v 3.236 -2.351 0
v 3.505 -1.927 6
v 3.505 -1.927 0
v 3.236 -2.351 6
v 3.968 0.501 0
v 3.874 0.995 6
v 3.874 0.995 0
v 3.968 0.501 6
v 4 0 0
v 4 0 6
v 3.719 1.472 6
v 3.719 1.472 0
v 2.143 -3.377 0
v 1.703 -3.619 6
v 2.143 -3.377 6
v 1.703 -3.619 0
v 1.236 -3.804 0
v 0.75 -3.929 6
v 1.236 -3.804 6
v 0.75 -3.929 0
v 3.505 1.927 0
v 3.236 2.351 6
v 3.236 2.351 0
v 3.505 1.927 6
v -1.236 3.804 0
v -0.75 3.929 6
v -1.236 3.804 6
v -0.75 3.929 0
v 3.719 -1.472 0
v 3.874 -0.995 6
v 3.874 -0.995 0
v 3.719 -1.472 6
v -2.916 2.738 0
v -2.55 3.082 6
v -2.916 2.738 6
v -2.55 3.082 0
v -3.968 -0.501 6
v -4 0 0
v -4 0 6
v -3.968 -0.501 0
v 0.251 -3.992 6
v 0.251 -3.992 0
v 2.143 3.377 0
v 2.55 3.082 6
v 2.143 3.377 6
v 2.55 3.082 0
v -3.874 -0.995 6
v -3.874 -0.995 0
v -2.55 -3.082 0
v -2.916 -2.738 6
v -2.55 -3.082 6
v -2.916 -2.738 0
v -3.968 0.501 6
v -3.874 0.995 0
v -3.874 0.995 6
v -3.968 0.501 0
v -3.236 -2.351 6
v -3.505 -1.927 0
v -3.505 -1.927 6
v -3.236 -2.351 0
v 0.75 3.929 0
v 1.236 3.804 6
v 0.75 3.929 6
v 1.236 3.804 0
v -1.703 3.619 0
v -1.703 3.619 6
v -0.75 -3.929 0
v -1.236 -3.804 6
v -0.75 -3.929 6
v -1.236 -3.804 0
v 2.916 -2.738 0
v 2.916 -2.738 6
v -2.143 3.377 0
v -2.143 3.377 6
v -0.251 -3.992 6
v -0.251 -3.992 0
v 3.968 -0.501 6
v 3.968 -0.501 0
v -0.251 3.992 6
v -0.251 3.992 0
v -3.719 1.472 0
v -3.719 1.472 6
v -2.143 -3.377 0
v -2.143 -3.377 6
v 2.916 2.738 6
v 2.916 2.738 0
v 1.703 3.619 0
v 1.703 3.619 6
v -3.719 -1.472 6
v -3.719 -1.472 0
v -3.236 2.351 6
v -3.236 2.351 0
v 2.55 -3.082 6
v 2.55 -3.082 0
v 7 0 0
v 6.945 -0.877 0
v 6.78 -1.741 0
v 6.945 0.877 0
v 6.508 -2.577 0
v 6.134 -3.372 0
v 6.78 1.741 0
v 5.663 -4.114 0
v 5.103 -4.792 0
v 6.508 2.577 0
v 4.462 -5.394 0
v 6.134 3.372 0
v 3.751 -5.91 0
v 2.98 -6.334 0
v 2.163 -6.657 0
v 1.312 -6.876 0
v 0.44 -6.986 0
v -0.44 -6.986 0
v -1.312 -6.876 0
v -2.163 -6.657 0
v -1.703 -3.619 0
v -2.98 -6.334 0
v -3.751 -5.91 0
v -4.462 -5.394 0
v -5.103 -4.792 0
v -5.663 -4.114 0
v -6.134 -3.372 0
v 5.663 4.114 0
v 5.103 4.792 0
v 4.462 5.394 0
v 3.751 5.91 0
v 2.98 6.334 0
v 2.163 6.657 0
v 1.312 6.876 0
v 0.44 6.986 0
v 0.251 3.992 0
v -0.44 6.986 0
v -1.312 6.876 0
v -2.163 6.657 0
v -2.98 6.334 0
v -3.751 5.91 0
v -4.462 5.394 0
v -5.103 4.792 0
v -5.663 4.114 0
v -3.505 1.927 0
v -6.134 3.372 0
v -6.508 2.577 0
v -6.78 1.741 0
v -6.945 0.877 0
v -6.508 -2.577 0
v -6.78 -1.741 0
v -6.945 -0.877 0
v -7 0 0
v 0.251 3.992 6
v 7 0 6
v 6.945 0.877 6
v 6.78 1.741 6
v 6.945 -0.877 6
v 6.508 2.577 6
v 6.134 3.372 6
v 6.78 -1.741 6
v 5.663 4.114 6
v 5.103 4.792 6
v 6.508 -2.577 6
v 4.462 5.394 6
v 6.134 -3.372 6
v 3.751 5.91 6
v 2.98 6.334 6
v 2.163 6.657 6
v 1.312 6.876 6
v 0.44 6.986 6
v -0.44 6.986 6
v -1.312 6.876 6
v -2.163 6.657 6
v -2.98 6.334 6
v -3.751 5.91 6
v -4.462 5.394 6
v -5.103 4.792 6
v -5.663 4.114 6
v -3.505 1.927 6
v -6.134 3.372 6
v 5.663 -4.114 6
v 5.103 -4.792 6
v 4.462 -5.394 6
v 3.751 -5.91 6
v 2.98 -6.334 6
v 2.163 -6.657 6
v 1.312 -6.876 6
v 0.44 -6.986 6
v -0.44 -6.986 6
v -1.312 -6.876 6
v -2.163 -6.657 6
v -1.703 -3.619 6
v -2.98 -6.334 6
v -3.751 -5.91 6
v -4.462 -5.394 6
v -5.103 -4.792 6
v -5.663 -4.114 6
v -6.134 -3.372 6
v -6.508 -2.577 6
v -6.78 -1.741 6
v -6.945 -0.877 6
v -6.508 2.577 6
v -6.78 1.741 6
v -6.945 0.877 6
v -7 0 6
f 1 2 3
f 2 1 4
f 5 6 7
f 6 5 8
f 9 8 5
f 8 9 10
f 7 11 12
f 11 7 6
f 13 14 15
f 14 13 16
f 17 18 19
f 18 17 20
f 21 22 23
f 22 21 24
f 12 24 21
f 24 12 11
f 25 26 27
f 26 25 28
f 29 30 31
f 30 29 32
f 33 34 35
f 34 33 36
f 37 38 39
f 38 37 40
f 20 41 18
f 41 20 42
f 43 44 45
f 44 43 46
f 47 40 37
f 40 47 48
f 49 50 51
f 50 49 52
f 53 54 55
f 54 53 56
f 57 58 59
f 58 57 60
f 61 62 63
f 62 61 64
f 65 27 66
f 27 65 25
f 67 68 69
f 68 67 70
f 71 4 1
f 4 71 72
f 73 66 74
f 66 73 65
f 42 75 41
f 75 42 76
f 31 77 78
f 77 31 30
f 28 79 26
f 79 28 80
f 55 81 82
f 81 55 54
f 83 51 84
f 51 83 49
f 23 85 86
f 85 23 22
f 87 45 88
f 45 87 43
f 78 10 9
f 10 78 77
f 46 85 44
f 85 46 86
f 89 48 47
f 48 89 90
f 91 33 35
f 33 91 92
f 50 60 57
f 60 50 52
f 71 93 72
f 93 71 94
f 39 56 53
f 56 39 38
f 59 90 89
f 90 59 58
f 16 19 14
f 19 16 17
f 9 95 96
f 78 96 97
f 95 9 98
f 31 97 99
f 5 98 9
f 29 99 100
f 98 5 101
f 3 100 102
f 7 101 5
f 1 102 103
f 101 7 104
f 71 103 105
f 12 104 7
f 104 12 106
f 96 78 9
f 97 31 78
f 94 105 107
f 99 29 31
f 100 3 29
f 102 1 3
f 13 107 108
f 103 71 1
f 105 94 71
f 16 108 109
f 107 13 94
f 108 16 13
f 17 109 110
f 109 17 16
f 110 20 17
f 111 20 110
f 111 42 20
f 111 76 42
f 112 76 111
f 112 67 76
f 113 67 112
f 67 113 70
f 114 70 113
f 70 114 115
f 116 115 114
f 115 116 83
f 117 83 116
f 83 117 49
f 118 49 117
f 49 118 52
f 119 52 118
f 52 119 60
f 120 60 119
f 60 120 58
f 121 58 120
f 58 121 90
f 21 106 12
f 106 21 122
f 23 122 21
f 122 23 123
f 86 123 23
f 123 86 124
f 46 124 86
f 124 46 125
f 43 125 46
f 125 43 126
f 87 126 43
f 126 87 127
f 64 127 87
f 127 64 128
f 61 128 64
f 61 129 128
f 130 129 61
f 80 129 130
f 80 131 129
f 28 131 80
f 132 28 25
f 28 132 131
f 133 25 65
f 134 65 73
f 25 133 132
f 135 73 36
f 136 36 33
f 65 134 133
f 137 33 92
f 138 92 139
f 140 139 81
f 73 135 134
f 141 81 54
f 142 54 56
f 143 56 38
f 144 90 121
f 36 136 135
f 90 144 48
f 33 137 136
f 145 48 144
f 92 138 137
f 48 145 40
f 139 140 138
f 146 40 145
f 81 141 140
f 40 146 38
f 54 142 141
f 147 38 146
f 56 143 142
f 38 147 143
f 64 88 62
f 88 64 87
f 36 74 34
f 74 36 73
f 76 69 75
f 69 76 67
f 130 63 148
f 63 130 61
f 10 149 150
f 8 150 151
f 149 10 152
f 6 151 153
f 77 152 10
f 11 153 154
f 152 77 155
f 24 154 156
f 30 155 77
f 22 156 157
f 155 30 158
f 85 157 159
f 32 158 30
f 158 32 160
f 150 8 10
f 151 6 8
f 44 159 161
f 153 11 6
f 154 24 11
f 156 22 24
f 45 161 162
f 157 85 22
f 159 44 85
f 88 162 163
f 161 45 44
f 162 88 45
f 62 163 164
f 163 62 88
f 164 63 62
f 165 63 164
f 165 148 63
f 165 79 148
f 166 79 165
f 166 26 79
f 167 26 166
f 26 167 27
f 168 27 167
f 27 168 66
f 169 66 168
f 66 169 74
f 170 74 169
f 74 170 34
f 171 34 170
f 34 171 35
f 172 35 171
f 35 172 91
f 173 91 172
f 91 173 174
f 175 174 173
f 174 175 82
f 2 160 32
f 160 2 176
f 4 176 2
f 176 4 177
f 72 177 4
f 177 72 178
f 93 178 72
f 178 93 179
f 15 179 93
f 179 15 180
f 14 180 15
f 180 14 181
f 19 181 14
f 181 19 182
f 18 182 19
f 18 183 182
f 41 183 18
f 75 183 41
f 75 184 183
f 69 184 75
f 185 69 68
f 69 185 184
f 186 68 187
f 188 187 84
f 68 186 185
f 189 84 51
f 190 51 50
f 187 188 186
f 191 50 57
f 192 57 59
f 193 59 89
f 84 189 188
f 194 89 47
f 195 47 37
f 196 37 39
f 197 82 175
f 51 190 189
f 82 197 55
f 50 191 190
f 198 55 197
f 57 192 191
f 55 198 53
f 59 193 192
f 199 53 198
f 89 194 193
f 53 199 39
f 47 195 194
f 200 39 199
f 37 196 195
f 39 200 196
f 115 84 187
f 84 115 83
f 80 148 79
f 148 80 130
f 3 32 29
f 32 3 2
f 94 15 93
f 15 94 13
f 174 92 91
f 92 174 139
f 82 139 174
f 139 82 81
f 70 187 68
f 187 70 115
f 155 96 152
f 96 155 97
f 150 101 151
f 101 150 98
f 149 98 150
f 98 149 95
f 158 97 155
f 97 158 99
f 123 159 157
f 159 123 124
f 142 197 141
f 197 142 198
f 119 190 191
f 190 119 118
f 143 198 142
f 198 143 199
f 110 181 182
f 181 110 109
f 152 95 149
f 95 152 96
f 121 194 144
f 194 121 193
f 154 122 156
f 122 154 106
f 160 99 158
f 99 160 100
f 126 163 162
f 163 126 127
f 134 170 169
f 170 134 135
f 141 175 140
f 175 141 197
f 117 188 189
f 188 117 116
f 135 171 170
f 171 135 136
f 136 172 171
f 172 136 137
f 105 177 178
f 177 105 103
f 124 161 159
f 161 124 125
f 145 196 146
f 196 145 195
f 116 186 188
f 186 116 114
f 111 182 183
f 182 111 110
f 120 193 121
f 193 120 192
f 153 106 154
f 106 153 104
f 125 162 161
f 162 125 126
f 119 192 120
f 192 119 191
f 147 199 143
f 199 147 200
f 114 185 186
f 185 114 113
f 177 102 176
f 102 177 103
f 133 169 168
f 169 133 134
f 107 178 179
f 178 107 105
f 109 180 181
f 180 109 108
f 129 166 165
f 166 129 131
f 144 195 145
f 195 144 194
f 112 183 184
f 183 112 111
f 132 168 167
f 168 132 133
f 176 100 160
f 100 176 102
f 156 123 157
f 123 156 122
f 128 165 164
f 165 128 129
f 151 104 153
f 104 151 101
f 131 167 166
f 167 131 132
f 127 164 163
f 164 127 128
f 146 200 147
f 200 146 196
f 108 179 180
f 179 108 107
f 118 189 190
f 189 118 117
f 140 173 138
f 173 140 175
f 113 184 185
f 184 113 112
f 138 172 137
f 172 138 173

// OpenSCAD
$fn = 50;

difference() {
	union() {
		cylinder(h = 6, r = 7.0);
	}
	union() {
		translate(v = [0.0, 0.0, -100.0]) {
			cylinder(h = 200, r = 3.25);
		}
		translate(v = [0.0, 0.0, -100.0]) {
			cylinder(h = 200, r = 1.8);
		}
		cylinder(h = 6, r = 4.0);
	}
}
